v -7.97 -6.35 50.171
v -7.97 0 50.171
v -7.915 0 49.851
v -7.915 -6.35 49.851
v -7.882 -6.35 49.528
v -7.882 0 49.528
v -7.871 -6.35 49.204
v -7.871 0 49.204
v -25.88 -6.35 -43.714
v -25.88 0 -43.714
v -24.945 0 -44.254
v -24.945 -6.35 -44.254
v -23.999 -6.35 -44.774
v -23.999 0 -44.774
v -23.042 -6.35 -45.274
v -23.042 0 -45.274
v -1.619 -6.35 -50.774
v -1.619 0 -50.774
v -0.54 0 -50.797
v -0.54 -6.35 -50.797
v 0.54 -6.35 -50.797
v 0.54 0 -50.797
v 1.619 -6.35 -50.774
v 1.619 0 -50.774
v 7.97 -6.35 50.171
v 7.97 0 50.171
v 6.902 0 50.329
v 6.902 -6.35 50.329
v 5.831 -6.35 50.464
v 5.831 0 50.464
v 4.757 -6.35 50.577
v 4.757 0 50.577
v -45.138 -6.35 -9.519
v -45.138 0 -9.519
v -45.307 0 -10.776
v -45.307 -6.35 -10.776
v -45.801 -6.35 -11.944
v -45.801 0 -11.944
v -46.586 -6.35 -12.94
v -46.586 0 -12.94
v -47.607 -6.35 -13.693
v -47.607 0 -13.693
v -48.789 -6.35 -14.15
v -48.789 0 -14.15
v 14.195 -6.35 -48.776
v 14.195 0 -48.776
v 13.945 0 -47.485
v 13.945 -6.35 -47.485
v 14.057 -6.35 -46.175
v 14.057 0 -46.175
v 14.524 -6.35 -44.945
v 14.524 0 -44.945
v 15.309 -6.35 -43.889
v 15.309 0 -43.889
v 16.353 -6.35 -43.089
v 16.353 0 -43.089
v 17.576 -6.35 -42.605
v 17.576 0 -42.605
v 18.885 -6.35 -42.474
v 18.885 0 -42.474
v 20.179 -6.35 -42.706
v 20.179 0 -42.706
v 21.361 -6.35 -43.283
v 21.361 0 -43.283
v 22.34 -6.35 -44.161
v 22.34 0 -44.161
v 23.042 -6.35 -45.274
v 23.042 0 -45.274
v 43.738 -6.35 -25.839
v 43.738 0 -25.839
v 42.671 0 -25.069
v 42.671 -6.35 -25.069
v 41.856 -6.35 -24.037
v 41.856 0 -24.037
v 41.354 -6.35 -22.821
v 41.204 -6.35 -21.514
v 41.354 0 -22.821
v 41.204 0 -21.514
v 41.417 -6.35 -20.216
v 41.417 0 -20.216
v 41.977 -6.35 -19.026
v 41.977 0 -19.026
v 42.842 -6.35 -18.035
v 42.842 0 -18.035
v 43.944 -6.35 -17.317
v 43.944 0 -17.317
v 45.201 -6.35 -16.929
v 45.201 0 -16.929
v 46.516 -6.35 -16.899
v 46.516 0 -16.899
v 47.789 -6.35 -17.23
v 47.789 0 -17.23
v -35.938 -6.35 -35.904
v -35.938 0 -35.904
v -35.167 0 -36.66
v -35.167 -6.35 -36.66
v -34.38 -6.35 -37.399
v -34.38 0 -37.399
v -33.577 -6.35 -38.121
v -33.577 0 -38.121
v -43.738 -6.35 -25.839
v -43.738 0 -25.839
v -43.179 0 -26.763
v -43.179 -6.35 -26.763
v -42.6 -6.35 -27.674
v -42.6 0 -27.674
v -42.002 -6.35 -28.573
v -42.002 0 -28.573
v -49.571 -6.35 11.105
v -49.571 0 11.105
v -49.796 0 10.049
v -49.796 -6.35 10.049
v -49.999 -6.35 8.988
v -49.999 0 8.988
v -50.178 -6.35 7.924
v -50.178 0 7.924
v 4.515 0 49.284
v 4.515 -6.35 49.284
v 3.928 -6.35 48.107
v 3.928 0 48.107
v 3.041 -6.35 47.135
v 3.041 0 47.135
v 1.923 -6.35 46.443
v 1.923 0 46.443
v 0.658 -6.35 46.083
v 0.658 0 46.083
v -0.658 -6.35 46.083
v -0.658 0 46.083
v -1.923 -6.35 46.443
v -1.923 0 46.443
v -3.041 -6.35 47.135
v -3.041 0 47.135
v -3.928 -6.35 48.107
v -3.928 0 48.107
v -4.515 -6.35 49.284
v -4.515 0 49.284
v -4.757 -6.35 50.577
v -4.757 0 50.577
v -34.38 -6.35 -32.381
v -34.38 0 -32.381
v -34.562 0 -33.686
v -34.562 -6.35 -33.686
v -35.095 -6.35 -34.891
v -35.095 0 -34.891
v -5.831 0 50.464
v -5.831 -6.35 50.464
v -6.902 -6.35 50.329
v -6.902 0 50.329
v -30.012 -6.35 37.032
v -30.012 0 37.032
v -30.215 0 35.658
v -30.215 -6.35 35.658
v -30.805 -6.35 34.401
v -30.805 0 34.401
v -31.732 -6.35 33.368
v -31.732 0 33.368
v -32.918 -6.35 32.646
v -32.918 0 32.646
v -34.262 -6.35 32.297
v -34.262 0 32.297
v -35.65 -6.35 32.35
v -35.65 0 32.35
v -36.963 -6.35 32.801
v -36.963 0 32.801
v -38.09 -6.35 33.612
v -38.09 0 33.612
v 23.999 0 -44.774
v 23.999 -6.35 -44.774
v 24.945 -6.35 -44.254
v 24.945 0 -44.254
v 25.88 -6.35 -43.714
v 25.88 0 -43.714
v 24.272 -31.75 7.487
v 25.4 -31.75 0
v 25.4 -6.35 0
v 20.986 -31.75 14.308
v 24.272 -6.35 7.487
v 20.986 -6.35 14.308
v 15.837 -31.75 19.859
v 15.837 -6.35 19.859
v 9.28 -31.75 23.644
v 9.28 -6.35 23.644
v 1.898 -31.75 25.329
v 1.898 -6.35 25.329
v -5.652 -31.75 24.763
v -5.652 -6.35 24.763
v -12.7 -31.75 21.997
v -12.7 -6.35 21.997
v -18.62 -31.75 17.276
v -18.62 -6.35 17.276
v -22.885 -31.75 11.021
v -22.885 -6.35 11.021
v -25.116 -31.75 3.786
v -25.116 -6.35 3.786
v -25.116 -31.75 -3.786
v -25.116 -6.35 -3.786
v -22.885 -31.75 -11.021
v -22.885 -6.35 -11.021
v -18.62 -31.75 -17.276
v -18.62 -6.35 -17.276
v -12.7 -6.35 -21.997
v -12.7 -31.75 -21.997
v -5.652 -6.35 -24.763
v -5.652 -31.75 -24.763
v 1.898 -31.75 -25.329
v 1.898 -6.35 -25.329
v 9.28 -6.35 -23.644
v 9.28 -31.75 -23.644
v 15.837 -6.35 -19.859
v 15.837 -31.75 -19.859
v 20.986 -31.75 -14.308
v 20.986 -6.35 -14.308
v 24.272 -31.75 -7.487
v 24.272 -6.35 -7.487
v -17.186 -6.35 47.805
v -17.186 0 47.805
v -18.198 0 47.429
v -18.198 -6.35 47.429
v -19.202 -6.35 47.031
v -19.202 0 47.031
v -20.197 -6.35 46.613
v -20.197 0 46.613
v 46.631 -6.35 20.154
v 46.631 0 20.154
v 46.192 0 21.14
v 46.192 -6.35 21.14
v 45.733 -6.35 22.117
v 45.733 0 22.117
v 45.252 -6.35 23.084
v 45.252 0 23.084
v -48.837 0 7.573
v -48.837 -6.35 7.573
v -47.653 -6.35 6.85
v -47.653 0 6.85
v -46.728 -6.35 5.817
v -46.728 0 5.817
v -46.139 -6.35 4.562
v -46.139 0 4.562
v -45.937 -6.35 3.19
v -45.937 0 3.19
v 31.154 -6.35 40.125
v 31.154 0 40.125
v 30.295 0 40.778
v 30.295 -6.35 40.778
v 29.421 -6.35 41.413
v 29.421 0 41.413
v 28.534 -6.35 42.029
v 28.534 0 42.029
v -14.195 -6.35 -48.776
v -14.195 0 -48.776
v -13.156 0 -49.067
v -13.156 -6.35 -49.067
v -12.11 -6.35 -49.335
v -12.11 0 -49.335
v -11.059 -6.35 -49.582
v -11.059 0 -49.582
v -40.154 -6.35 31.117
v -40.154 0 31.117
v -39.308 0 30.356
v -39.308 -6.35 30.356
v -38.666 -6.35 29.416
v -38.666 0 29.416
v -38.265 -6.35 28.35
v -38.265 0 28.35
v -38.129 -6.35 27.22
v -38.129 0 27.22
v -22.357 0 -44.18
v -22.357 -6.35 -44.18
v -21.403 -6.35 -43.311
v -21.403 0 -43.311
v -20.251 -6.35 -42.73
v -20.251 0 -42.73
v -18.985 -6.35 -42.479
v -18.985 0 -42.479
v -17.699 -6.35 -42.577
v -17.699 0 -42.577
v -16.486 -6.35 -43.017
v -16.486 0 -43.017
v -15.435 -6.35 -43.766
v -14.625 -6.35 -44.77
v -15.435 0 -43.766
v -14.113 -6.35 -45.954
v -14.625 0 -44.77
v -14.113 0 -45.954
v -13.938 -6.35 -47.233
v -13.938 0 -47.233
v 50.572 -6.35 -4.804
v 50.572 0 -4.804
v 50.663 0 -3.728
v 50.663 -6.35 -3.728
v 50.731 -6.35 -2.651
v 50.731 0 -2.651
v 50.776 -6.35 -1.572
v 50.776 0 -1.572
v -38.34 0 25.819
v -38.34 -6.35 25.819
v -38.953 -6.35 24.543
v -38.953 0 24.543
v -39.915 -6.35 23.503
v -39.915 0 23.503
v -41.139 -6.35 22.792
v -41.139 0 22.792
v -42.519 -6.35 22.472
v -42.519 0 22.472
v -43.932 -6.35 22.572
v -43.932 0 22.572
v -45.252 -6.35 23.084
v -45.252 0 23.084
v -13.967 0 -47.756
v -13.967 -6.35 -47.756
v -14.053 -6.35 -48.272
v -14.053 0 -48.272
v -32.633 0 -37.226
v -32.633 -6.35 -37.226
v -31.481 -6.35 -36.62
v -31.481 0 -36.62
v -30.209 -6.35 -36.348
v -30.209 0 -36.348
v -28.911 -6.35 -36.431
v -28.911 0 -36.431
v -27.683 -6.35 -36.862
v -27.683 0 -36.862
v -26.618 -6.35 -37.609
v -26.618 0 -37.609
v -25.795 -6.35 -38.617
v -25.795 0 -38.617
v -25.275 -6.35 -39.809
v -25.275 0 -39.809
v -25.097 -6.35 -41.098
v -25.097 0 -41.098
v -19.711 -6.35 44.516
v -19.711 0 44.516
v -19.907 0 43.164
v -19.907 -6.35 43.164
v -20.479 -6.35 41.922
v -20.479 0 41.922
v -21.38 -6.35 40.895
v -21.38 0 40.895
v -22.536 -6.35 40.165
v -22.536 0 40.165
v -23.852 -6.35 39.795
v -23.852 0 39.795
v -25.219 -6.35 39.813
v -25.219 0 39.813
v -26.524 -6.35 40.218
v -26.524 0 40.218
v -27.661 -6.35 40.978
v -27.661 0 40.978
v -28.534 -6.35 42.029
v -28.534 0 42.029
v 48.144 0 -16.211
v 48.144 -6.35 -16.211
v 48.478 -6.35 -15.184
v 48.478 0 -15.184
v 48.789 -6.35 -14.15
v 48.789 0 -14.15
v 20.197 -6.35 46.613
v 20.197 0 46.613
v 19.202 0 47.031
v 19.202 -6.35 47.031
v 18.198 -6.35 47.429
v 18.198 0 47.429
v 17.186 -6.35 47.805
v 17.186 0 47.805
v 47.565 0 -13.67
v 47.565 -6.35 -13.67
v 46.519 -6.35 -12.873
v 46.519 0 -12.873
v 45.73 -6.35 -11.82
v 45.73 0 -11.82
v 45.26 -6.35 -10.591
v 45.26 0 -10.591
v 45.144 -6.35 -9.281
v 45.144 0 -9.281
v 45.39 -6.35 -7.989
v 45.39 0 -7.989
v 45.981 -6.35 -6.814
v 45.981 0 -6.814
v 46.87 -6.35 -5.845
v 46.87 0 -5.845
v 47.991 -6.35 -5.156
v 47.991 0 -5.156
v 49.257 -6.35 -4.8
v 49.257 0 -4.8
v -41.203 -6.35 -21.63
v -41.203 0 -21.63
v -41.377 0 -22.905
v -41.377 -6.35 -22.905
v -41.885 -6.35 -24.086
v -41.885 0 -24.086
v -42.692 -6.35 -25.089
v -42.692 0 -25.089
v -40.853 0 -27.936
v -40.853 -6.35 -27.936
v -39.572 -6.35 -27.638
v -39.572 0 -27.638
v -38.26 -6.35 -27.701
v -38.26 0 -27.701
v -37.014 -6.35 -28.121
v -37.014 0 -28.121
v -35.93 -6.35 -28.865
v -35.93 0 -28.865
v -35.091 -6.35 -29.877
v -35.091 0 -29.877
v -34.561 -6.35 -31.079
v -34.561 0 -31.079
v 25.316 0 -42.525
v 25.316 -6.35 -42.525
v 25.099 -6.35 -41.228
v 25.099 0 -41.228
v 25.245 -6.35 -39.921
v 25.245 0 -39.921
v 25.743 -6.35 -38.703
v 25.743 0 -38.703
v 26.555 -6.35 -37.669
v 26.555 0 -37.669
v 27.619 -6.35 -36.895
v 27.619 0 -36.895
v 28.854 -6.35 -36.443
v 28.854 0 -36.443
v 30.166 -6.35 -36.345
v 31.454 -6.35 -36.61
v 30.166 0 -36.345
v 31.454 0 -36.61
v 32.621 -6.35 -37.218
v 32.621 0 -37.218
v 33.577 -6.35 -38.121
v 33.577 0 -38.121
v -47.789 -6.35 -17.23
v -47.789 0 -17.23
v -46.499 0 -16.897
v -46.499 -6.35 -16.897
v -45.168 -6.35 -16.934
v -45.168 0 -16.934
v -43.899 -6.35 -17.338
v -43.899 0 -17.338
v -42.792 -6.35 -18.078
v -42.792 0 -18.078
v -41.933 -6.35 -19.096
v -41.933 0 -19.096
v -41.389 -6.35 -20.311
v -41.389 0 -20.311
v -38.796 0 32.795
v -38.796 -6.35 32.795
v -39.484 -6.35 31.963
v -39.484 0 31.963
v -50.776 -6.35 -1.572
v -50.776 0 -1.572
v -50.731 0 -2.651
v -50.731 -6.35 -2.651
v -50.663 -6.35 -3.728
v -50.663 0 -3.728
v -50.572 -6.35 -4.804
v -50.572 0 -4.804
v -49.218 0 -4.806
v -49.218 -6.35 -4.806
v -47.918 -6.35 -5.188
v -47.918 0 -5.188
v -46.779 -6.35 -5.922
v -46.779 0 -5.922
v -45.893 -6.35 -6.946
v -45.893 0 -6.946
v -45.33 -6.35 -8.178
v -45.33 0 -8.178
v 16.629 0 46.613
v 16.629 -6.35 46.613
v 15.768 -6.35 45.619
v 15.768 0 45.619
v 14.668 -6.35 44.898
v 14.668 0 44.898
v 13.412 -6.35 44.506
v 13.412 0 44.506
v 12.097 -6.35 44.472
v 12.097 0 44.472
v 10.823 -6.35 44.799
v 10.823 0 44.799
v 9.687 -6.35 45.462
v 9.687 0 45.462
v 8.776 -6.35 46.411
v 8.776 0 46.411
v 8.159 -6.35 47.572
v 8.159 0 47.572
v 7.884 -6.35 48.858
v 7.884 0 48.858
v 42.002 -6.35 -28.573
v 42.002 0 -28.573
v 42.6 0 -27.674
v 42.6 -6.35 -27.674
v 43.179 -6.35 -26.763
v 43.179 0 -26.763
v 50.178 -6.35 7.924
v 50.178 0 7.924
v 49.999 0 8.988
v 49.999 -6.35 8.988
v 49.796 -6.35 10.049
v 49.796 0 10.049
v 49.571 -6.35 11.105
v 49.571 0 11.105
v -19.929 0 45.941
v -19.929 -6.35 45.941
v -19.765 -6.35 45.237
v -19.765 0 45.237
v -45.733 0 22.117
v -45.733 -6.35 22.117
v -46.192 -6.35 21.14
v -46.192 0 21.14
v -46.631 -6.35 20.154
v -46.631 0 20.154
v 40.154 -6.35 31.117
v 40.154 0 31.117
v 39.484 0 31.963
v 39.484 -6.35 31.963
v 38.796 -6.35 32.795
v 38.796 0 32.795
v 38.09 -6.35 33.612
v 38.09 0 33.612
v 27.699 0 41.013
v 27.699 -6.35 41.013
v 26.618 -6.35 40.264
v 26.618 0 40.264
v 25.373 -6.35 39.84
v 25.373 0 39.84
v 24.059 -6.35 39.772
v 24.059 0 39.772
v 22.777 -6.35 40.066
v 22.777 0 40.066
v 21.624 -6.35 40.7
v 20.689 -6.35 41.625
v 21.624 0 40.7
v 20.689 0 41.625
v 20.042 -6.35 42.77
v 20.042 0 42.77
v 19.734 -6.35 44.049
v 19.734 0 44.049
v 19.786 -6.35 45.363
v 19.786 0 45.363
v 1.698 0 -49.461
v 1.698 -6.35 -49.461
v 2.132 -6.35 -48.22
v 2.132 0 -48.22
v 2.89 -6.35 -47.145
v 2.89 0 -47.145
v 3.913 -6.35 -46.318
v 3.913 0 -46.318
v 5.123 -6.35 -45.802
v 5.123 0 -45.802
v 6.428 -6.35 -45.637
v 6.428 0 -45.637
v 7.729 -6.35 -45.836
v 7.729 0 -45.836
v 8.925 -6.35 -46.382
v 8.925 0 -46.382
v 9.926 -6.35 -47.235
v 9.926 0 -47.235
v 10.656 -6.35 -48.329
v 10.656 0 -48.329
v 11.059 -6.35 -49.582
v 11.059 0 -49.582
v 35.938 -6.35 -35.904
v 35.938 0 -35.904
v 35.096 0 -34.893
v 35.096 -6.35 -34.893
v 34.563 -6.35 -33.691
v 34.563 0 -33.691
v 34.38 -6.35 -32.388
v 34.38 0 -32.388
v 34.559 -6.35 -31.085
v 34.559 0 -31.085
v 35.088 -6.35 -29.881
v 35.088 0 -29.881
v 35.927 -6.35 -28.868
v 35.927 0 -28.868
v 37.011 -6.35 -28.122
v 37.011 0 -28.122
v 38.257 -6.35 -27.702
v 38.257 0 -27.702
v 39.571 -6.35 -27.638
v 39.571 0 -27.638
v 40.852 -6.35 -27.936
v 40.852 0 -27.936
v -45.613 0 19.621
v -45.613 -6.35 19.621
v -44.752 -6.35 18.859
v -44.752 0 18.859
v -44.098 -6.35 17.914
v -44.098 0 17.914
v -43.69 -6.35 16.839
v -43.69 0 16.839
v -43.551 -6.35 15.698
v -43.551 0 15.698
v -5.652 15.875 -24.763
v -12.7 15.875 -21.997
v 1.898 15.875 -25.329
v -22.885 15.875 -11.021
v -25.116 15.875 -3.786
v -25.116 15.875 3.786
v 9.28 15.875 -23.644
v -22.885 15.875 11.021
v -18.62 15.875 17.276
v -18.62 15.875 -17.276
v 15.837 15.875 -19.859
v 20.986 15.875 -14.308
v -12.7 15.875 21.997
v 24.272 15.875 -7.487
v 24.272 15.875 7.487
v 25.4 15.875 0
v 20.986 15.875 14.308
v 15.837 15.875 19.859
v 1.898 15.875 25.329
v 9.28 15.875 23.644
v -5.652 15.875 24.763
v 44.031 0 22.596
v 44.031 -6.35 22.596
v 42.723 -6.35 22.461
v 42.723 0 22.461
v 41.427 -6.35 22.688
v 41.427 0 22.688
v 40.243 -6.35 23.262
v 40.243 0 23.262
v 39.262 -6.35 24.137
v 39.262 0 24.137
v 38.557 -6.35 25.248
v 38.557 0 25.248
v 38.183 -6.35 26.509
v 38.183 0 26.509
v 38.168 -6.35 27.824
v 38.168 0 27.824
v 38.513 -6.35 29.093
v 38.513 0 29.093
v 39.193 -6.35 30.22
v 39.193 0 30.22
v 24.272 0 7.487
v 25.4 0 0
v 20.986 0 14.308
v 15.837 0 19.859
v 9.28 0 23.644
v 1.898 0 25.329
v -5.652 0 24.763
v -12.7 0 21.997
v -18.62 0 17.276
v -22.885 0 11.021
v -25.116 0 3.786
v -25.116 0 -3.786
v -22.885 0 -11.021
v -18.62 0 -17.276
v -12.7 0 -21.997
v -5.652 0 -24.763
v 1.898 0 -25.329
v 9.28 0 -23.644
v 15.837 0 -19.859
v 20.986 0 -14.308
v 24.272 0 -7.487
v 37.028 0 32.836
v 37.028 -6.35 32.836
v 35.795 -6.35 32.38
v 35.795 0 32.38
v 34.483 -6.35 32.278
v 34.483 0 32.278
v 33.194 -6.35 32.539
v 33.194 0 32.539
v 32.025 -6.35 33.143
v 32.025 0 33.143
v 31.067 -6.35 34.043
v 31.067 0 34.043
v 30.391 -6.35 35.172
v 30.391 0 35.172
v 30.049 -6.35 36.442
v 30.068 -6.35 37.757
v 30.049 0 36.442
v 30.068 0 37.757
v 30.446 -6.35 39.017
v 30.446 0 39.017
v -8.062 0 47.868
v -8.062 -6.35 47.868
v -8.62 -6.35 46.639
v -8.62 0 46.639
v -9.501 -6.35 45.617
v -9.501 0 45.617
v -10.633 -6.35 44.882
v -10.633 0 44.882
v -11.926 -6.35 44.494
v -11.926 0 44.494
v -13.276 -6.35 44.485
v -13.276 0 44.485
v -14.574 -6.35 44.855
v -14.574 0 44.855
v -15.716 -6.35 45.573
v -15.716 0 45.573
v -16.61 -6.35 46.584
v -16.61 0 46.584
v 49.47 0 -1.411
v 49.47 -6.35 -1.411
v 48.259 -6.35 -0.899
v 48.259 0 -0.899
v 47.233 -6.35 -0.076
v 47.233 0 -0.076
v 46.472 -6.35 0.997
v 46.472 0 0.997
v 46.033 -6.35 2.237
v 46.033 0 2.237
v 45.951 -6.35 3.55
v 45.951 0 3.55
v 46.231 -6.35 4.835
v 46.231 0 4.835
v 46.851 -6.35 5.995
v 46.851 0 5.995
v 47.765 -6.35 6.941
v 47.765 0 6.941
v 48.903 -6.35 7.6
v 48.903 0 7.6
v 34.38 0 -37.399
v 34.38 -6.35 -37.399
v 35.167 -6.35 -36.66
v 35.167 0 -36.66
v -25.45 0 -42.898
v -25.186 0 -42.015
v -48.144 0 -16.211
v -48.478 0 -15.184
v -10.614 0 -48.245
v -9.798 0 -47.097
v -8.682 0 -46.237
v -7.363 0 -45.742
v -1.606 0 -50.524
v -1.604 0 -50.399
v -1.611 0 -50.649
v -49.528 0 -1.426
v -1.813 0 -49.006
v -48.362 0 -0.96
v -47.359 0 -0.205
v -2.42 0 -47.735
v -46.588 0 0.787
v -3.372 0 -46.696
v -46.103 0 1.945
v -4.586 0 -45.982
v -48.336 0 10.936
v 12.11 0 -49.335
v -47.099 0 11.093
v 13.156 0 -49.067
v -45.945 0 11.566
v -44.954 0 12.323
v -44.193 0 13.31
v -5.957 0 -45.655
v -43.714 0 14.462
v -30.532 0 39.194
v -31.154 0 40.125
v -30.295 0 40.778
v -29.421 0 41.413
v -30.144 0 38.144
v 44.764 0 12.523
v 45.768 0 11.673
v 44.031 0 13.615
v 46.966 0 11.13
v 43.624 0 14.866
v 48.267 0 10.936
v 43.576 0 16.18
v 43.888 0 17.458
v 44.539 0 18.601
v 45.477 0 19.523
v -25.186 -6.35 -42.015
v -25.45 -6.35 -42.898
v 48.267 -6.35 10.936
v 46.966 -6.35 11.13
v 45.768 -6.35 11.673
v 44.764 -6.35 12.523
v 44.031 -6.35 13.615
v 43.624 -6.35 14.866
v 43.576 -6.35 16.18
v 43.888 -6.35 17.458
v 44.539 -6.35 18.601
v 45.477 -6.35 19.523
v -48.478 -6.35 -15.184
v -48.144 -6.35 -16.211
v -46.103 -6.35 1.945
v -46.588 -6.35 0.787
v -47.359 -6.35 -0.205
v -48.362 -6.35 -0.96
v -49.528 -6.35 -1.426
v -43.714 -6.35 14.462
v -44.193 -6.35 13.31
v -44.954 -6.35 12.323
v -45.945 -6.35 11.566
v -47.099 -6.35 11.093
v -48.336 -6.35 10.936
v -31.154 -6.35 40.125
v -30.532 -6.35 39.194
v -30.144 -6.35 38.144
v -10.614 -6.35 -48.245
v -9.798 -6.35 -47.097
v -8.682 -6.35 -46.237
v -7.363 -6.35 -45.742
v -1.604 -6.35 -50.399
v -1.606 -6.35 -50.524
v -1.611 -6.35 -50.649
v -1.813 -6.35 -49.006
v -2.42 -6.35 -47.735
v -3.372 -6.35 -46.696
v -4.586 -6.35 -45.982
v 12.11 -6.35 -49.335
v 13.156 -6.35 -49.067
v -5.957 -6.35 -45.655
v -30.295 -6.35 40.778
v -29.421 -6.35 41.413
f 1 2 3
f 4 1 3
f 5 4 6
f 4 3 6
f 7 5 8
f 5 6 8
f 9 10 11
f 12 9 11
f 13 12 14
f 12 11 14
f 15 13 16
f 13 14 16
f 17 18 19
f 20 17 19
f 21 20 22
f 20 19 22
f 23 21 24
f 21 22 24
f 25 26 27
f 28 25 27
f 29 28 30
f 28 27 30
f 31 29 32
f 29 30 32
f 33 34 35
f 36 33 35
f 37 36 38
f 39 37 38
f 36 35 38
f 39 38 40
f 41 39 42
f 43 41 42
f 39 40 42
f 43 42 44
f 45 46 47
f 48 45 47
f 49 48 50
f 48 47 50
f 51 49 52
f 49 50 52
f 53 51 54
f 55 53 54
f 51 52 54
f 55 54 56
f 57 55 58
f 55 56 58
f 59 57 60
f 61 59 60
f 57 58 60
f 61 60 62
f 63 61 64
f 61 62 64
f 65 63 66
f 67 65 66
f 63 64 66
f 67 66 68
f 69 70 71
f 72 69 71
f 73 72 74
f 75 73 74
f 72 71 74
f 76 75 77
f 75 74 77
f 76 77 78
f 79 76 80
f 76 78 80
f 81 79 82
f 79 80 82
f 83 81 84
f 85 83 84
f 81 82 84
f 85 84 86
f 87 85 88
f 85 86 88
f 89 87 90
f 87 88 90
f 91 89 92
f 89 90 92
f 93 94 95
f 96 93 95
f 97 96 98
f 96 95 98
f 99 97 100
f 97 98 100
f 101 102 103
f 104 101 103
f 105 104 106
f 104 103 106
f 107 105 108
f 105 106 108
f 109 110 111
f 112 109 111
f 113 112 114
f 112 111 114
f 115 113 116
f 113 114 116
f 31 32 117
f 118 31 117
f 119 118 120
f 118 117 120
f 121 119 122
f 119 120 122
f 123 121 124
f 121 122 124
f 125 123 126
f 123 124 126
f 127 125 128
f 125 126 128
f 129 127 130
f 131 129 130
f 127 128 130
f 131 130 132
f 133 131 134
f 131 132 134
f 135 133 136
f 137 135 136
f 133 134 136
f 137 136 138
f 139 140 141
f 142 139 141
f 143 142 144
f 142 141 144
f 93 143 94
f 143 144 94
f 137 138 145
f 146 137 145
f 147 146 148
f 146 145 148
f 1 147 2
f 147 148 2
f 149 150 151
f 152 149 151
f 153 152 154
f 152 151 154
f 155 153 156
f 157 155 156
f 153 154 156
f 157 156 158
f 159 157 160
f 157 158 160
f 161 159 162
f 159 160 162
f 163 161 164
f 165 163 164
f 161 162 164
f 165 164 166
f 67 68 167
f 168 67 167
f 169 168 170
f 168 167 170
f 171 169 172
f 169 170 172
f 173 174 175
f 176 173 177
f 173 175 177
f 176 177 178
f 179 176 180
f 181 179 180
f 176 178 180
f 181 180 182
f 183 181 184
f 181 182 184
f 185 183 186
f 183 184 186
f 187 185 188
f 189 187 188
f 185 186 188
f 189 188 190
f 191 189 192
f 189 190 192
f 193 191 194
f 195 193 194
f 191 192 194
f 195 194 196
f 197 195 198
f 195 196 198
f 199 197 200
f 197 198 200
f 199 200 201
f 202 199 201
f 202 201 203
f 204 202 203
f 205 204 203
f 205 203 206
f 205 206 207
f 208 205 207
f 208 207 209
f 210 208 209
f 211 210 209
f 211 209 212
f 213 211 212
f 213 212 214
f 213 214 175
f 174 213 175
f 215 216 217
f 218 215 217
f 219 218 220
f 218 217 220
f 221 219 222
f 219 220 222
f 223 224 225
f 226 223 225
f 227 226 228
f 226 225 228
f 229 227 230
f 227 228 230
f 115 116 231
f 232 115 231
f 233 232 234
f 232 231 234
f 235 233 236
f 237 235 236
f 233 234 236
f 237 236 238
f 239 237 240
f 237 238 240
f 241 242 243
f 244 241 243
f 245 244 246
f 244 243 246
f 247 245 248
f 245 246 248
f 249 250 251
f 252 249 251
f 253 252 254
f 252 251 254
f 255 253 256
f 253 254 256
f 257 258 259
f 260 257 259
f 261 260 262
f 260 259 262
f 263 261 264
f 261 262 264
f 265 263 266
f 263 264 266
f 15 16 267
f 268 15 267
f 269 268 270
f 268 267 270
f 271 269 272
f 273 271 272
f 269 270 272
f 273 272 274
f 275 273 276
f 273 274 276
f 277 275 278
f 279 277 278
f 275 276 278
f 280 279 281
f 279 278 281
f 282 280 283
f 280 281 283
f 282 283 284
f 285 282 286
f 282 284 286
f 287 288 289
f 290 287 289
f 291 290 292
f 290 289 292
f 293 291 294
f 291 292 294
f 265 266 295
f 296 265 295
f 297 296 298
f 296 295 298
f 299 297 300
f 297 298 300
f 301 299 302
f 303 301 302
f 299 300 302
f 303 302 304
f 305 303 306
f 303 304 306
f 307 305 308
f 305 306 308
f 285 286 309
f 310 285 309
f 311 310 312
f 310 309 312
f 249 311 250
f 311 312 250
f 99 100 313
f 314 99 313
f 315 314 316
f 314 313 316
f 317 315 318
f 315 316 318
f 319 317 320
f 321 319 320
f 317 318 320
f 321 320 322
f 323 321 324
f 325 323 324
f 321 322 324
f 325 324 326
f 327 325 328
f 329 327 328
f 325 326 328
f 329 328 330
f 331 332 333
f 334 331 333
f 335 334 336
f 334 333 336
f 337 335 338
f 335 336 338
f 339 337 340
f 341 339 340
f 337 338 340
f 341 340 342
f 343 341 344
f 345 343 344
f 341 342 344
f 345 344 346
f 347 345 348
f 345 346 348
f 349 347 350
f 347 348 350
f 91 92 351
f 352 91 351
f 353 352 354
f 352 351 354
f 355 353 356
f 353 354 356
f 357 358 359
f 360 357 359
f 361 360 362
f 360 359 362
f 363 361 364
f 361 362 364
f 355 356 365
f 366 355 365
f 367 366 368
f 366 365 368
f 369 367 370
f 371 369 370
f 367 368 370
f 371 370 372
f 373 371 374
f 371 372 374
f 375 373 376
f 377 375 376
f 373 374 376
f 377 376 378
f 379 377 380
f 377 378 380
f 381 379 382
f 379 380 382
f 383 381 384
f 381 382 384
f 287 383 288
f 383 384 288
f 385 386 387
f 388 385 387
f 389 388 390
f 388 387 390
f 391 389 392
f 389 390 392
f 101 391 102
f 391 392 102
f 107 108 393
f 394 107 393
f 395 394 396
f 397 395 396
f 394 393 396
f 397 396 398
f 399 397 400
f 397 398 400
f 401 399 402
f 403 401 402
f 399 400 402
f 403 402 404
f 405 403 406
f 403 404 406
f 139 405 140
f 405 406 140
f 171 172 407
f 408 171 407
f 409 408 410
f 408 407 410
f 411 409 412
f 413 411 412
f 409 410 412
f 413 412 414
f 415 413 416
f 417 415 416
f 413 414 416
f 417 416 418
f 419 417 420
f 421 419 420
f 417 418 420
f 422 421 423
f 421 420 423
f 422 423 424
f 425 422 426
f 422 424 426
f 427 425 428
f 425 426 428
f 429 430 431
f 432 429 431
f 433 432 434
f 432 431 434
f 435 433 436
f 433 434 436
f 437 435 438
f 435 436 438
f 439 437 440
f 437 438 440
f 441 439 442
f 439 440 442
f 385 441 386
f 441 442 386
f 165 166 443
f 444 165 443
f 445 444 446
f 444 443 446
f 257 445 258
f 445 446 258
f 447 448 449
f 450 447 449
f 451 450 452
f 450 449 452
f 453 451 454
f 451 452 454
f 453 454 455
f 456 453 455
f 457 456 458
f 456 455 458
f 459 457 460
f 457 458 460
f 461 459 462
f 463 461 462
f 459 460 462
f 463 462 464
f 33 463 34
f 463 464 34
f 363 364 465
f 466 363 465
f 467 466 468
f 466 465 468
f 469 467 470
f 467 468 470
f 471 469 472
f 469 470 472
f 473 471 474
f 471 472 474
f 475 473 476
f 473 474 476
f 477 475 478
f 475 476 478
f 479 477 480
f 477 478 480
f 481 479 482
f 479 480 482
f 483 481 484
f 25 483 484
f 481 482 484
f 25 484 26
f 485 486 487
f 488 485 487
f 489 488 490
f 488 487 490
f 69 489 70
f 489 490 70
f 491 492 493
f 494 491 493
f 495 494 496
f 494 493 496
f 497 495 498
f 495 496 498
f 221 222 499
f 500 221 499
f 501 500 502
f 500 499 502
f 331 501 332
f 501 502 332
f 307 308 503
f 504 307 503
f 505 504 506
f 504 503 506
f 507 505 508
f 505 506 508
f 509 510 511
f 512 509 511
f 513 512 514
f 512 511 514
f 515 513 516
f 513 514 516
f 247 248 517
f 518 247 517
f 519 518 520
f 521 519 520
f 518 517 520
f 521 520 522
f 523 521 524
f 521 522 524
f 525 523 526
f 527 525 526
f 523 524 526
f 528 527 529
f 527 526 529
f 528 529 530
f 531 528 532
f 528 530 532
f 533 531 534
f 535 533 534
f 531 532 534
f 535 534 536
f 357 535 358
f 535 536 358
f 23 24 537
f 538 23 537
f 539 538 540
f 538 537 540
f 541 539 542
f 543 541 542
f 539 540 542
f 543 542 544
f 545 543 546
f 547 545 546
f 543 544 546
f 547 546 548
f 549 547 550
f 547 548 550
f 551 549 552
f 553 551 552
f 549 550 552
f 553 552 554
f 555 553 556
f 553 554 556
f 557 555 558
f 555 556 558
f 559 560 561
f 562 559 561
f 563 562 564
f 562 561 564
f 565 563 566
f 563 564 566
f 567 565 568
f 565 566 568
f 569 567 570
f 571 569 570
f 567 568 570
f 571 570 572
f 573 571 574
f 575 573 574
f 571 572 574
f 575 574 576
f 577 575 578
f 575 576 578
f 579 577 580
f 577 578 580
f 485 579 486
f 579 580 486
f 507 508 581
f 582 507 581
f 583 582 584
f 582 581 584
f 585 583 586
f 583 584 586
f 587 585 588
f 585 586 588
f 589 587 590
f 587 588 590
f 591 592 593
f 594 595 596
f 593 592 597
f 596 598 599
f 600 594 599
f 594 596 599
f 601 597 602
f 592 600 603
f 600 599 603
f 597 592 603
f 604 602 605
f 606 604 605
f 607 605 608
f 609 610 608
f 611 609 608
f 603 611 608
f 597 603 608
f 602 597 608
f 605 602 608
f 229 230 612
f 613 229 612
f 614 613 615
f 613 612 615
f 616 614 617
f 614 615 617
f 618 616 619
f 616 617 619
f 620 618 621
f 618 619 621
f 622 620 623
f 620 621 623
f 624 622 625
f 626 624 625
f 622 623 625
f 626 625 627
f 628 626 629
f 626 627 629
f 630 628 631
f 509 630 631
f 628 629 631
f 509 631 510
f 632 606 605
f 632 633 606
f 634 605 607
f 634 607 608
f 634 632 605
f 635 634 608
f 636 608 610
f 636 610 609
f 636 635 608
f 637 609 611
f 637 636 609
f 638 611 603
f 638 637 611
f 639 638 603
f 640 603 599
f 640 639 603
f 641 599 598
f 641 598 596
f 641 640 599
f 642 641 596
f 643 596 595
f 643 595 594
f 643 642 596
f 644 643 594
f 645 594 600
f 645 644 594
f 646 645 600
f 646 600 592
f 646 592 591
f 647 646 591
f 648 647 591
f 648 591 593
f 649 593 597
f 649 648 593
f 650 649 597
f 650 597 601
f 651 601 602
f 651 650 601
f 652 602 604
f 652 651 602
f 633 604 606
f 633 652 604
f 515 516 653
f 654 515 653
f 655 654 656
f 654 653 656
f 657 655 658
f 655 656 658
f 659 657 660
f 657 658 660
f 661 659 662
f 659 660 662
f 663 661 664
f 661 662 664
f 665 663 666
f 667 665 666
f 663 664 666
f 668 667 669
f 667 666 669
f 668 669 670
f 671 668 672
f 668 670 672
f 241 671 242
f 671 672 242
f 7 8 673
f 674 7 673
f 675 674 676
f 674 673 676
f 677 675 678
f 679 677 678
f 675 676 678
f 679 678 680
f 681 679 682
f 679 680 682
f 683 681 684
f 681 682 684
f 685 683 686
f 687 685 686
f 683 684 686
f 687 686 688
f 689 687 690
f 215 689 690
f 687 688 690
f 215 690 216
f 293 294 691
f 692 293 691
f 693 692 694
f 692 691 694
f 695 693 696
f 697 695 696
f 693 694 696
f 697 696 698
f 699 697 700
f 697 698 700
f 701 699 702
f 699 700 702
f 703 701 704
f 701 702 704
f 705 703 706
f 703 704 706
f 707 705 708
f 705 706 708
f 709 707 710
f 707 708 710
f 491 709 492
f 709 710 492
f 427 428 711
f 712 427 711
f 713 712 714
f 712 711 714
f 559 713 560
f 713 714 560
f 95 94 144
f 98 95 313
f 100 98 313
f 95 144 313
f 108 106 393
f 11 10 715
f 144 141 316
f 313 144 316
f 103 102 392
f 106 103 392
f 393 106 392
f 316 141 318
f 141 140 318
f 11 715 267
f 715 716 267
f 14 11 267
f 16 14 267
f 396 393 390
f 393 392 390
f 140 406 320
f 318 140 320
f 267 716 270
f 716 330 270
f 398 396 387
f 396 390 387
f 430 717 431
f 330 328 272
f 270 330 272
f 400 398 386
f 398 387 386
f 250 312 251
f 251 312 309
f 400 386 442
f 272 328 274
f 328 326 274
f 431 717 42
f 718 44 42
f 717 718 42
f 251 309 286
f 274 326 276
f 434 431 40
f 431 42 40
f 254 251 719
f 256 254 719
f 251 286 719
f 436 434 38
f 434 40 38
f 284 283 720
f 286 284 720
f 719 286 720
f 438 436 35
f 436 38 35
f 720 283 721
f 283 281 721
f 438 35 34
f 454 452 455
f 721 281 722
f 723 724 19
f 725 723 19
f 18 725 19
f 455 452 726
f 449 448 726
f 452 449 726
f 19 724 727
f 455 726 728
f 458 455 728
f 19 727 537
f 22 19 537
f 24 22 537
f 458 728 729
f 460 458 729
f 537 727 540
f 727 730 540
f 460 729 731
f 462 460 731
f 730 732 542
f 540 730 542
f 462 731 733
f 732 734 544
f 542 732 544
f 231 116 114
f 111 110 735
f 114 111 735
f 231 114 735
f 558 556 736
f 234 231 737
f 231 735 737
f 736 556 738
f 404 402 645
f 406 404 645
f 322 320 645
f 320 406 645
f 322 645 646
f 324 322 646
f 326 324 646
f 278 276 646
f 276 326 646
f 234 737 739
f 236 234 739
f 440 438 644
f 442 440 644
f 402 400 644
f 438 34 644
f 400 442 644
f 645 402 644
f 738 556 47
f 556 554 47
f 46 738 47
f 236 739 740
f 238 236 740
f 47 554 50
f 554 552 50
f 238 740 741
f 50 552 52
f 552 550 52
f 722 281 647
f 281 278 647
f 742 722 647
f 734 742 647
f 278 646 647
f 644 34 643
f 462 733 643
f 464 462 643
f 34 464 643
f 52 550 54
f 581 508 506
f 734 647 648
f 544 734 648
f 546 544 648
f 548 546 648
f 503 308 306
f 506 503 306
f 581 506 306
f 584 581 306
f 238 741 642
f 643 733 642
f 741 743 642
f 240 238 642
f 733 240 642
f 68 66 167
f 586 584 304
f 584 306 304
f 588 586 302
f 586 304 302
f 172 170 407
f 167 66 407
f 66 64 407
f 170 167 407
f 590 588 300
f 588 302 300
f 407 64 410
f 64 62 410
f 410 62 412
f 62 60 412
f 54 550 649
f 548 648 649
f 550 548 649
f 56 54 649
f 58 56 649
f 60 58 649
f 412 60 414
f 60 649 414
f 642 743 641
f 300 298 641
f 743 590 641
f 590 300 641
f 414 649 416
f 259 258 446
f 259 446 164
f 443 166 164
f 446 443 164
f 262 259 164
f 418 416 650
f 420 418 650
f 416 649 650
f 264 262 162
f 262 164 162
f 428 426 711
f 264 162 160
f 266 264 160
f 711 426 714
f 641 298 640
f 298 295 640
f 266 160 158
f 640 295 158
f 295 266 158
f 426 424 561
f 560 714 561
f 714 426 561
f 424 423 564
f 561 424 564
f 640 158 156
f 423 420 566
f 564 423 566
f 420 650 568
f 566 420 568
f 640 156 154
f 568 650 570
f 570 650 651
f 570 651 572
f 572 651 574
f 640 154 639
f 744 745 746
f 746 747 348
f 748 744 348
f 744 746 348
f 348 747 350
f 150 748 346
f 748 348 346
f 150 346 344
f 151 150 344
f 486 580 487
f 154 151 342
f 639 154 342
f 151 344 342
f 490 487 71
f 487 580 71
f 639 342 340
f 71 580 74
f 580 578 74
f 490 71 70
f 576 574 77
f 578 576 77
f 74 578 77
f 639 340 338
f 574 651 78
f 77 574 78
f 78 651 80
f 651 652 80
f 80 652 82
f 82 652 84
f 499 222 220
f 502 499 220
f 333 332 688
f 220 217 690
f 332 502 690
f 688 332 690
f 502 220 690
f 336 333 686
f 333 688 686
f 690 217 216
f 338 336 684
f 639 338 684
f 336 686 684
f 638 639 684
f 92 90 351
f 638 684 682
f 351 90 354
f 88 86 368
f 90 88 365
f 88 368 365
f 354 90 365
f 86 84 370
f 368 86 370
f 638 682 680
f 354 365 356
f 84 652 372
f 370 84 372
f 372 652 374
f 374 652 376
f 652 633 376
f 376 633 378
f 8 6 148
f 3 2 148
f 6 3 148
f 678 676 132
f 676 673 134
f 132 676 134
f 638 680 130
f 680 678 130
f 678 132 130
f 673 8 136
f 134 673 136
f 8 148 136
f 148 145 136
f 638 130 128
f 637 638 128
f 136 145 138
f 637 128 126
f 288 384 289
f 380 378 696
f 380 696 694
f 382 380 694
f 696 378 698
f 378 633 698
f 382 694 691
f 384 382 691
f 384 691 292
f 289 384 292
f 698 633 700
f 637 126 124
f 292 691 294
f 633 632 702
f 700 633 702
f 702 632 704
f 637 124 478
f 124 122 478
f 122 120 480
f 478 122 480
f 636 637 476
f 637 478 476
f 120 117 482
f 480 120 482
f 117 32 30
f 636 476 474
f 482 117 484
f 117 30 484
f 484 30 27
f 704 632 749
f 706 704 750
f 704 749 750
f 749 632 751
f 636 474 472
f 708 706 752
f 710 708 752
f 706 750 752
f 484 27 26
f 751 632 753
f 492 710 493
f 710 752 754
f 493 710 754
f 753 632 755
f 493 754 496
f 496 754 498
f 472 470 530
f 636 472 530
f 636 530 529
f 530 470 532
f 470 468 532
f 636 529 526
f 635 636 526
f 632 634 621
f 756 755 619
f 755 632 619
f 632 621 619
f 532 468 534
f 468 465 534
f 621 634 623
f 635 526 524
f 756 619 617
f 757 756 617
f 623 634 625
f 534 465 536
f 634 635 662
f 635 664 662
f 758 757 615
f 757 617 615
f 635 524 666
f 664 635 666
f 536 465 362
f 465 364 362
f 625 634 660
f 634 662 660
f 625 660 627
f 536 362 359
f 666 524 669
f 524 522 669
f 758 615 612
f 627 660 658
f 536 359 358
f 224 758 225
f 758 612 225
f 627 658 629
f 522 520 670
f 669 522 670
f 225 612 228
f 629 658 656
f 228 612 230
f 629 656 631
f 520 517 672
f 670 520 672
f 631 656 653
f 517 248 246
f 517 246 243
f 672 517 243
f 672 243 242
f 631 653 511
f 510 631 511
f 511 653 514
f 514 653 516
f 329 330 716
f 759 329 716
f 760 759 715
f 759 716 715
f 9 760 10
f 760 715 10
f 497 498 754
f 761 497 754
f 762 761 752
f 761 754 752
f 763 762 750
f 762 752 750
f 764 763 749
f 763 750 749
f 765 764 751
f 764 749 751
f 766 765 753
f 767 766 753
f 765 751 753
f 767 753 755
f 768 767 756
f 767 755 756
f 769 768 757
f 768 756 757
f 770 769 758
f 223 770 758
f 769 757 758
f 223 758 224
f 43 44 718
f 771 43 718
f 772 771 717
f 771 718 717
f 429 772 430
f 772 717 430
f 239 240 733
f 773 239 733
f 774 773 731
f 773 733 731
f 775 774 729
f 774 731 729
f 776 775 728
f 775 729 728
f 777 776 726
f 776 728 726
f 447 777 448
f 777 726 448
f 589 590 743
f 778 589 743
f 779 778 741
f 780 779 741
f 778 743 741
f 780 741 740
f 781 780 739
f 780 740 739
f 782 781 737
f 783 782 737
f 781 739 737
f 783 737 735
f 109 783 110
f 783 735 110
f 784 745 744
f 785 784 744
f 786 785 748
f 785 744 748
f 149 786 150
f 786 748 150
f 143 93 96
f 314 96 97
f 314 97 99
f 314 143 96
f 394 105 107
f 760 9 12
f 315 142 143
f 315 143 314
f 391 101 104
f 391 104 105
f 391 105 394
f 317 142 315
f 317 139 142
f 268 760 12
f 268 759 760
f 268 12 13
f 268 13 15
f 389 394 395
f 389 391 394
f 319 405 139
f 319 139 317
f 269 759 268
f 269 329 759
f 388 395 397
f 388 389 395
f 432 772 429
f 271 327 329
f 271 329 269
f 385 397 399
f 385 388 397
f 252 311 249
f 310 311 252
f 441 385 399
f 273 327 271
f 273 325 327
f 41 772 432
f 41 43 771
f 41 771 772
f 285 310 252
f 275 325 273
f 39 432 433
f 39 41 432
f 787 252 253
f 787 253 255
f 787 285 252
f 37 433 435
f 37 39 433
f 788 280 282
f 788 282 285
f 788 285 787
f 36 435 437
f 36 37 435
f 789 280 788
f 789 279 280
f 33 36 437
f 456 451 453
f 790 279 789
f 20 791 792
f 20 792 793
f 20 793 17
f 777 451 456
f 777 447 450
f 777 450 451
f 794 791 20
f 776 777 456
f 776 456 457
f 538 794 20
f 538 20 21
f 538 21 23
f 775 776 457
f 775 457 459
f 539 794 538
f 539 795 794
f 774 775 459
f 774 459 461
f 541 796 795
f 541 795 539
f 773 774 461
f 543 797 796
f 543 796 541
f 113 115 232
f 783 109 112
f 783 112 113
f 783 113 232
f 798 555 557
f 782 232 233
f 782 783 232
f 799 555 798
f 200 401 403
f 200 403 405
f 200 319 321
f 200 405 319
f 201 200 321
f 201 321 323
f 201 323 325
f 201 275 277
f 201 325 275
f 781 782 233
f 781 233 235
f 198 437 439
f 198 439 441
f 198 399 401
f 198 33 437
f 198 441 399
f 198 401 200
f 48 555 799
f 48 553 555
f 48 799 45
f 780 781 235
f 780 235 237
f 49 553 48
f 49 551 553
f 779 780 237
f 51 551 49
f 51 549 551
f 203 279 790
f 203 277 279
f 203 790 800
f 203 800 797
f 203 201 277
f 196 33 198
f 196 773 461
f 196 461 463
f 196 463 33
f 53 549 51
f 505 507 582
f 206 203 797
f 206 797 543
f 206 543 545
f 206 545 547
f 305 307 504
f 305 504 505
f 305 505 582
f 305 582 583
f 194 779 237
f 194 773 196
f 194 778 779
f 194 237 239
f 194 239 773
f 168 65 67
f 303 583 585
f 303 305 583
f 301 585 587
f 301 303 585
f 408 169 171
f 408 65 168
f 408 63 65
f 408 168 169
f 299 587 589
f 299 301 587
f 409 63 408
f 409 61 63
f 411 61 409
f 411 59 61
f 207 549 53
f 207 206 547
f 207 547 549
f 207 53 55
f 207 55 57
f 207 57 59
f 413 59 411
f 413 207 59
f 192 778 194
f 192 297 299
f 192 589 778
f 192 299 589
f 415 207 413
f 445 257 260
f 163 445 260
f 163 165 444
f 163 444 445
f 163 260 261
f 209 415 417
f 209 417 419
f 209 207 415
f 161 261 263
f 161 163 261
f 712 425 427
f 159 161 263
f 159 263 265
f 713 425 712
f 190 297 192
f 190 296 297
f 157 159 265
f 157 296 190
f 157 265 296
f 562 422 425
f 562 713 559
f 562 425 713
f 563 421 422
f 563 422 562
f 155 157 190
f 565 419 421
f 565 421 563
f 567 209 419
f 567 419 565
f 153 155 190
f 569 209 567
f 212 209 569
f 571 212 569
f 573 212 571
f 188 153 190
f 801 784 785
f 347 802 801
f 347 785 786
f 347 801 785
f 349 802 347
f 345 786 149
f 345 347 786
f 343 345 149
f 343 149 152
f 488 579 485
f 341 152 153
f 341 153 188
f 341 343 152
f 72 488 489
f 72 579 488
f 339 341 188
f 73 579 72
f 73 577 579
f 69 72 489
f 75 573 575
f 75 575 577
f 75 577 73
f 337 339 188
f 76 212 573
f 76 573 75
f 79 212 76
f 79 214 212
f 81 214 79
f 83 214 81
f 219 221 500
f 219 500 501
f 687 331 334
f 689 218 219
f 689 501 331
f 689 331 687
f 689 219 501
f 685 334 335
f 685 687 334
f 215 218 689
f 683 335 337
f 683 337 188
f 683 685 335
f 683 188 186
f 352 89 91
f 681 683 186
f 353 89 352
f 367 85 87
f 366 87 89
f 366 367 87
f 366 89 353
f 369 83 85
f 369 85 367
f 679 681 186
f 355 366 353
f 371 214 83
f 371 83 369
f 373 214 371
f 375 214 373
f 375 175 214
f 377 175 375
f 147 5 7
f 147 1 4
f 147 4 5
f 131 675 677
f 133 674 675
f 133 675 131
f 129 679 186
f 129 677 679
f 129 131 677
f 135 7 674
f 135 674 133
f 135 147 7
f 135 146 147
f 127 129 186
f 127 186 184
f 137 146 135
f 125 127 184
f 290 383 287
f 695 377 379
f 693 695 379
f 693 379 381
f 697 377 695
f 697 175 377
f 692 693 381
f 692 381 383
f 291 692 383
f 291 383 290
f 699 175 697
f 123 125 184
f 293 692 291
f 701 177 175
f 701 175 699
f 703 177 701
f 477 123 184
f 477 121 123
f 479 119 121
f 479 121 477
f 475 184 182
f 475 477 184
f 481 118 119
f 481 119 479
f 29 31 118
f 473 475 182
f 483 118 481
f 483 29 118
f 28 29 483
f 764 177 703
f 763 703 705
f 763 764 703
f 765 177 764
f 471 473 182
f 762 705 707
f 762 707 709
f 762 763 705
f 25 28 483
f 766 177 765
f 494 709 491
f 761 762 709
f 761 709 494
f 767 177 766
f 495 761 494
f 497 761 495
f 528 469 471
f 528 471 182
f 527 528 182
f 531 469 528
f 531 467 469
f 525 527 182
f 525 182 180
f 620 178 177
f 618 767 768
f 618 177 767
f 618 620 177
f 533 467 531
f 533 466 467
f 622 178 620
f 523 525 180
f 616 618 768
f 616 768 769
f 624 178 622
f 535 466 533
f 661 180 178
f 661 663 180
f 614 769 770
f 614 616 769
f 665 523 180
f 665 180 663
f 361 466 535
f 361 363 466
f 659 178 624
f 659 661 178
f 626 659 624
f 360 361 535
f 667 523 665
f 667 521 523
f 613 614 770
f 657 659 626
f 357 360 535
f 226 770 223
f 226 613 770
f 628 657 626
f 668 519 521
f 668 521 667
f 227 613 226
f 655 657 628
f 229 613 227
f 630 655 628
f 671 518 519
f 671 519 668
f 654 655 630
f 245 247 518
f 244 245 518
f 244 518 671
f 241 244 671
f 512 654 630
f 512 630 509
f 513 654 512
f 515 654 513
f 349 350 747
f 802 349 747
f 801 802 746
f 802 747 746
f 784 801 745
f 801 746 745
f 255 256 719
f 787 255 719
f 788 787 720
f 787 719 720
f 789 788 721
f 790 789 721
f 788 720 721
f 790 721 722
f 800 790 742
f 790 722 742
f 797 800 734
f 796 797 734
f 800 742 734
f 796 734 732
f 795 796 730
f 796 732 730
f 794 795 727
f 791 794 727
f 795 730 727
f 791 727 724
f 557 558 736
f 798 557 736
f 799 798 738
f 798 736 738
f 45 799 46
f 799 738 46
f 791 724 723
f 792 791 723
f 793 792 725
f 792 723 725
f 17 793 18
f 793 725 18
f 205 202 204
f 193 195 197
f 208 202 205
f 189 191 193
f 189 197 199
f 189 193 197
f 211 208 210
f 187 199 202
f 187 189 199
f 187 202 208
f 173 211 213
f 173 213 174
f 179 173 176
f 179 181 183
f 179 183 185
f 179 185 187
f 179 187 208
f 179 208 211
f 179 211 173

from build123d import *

# Parameters (mm, degrees)
F0_R          = 25.4
F1_DEPTH      = 6.35
F2_DEPTH      = 31.75
F2_DEPTH_BACK = 3.175
F3_DEPTH      = 12.7


with BuildPart() as f1:
    # F0 (on Front) → F1 (new body)
    with BuildSketch(Plane.XZ):
        with BuildLine():
            ThreePointArc((50.7756672677, -1.5721366092), (45.94665551, 2.8907185428), (50.1782450005, 7.9236184075))
            ThreePointArc((50.1782450005, 7.9236184075), (49.900192337, 9.518970781), (49.5714307865, 11.1046499169))
            ThreePointArc((49.5714307865, 11.1046499169), (43.7842643689, 14.2263698785), (46.6312793948, 20.153505452))
            ThreePointArc((46.6312793948, 20.153505452), (45.9652142653, 21.6295880115), (45.2524389981, 23.0836904486))
            ThreePointArc((45.2524389981, 23.0836904486), (38.8707468703, 24.6681260738), (40.1542990068, 31.1170736296))
            ThreePointArc((40.1542990068, 31.1170736296), (39.142072733, 32.3811386792), (38.0900700405, 33.6122978136))
            ThreePointArc((38.0900700405, 33.6122978136), (31.5148373892, 33.5598931849), (31.1542763351, 40.1254416304))
            ThreePointArc((31.1542763351, 40.1254416304), (29.8594908165, 41.0980633142), (28.5343618968, 42.0289208896))
            ThreePointArc((28.5343618968, 42.0289208896), (22.1787347715, 40.3429687825), (20.1967159038, 46.6125805626))
            ThreePointArc((20.1967159038, 46.6125805626), (18.7007272764, 47.2326454831), (17.1857348531, 47.8047122945))
            ThreePointArc((17.1857348531, 47.8047122945), (11.4490606804, 44.5911472805), (7.970121534, 50.1708796289))
            ThreePointArc((7.970121534, 50.1708796289), (6.3669282651, 50.3994268268), (4.7572648839, 50.5767578125))
            ThreePointArc((4.7572648839, 50.5767578125), (0, 46.0375), (-4.7572648839, 50.5767578125))
            ThreePointArc((-4.7572648839, 50.5767578125), (-6.3669282651, 50.3994268268), (-7.970121534, 50.1708796289))
            ThreePointArc((-7.970121534, 50.1708796289), (-7.8958049616, 49.6899886809), (-7.870946268, 49.2040245853))
            ThreePointArc((-7.870946268, 49.2040245853), (-11.9259394259, 44.4943706364), (-17.1857348531, 47.8047122945))
            ThreePointArc((-17.1857348531, 47.8047122945), (-18.7007272764, 47.2326454831), (-20.1967159038, 46.6125805626))
            ThreePointArc((-20.1967159038, 46.6125805626), (-19.8337105062, 45.5922953741), (-19.7105866444, 44.5163793462))
            ThreePointArc((-19.7105866444, 44.5163793462), (-23.1808825467, 39.9325365457), (-28.5343618968, 42.0289208896))
            ThreePointArc((-28.5343618968, 42.0289208896), (-29.8594908165, 41.0980633142), (-31.1542763351, 40.1254416304))
            ThreePointArc((-31.1542763351, 40.1254416304), (-30.3070477444, 38.6805063948), (-30.0124929812, 37.031606273))
            ThreePointArc((-30.0124929812, 37.031606273), (-32.9184704584, 32.6458645601), (-38.0900700405, 33.6122978136))
            ThreePointArc((-38.0900700405, 33.6122978136), (-39.142072733, 32.3811386792), (-40.1542990068, 31.1170736296))
            ThreePointArc((-40.1542990068, 31.1170736296), (-38.6658064456, 29.4158812606), (-38.1293586155, 27.2200011849))
            ThreePointArc((-38.1293586155, 27.2200011849), (-40.5002961369, 23.1015263263), (-45.2524389981, 23.0836904486))
            ThreePointArc((-45.2524389981, 23.0836904486), (-45.9652142653, 21.6295880115), (-46.6312793948, 20.153505452))
            ThreePointArc((-46.6312793948, 20.153505452), (-44.3961592919, 18.4062930033), (-43.5511710278, 15.6980633142))
            ThreePointArc((-43.5511710278, 15.6980633142), (-45.4247849623, 11.9118061187), (-49.5714307865, 11.1046499169))
            ThreePointArc((-49.5714307865, 11.1046499169), (-49.900192337, 9.518970781), (-50.1782450005, 7.9236184075))
            ThreePointArc((-50.1782450005, 7.9236184075), (-47.1525680025, 6.3676272946), (-45.9372578042, 3.1897583921))
            ThreePointArc((-45.9372578042, 3.1897583921), (-47.3591076107, -0.2045696025), (-50.7756672677, -1.5721366092))
            ThreePointArc((-50.7756672677, -1.5721366092), (-50.6997578042, -3.1897583921), (-50.5723269302, -4.8041387226))
            ThreePointArc((-50.5723269302, -4.8041387226), (-46.7792657719, -5.9215795561), (-45.137692337, -9.518970781))
            ThreePointArc((-45.137692337, -9.518970781), (-46.1604620648, -12.4678389946), (-48.7894818346, -14.1501400102))
            ThreePointArc((-48.7894818346, -14.1501400102), (-48.3136710278, -15.6980633142), (-47.7887635668, -17.2300341484))
            ThreePointArc((-47.7887635668, -17.2300341484), (-43.3197698129, -17.6694074728), (-41.2027142653, -21.6295880115))
            ThreePointArc((-41.2027142653, -21.6295880115), (-41.8853816947, -24.0864910308), (-43.7376738227, -25.8390380738))
            ThreePointArc((-43.7376738227, -25.8390380738), (-42.8918586155, -27.2200011849), (-42.0024564338, -28.5733031609))
            ThreePointArc((-42.0024564338, -28.5733031609), (-37.0138306327, -28.1206232395), (-34.379572733, -32.3811386792))
            ThreePointArc((-34.379572733, -32.3811386792), (-34.7864792609, -34.3073296759), (-35.9376669086, -35.9043743458))
            ThreePointArc((-35.9376669086, -35.9043743458), (-34.7749929812, -37.031606273), (-33.5769804888, -38.1212064507))
            ThreePointArc((-33.5769804888, -38.1212064507), (-28.2820147175, -36.604403847), (-25.0969908165, -41.0980633142))
            ThreePointArc((-25.0969908165, -41.0980633142), (-25.2968267537, -42.4631651056), (-25.8795642131, -43.7137067307))
            ThreePointArc((-25.8795642131, -43.7137067307), (-24.4730866444, -44.5163793462), (-23.0417393722, -45.2738141391))
            ThreePointArc((-23.0417393722, -45.2738141391), (-17.6988949192, -42.5767096827), (-13.9382272764, -47.2326454831))
            ThreePointArc((-13.9382272764, -47.2326454831), (-14.0029485609, -48.0151295985), (-14.1953533198, -48.7763461539))
            ThreePointArc((-14.1953533198, -48.7763461539), (-12.633446268, -49.2040245853), (-11.0587010292, -49.5817015798))
            ThreePointArc((-11.0587010292, -49.5817015798), (-5.9565391444, -45.6546415819), (-1.6044282651, -50.3994268268))
            ThreePointArc((-1.6044282651, -50.3994268268), (-1.6081216736, -50.5869530242), (-1.6191961705, -50.7741883614))
            ThreePointArc((-1.6191961705, -50.7741883614), (0, -50.8), (1.6191961705, -50.7741883614))
            ThreePointArc((1.6191961705, -50.7741883614), (5.7700287402, -45.6744805618), (11.0587010292, -49.5817015798))
            ThreePointArc((11.0587010292, -49.5817015798), (12.633446268, -49.2040245853), (14.1953533198, -48.7763461539))
            ThreePointArc((14.1953533198, -48.7763461539), (16.9475340942, -42.8045849691), (23.0417393722, -45.2738141391))
            ThreePointArc((23.0417393722, -45.2738141391), (24.4730866444, -44.5163793462), (25.8795642131, -43.7137067307))
            ThreePointArc((25.8795642131, -43.7137067307), (27.0601635524, -37.2451198785), (33.5769804888, -38.1212064507))
            ThreePointArc((33.5769804888, -38.1212064507), (34.7749929812, -37.031606273), (35.9376669086, -35.9043743458))
            ThreePointArc((35.9376669086, -35.9043743458), (35.4725034143, -29.3454069281), (42.0024564338, -28.5733031609))
            ThreePointArc((42.0024564338, -28.5733031609), (42.8918586155, -27.2200011849), (43.7376738227, -25.8390380738))
            ThreePointArc((43.7376738227, -25.8390380738), (41.6559754279, -19.6018141354), (47.7887635668, -17.2300341484))
            ThreePointArc((47.7887635668, -17.2300341484), (48.3136710278, -15.6980633142), (48.7894818346, -14.1501400102))
            ThreePointArc((48.7894818346, -14.1501400102), (45.2220493054, -8.6265672702), (50.5723269302, -4.8041387226))
            ThreePointArc((50.5723269302, -4.8041387226), (50.6997578042, -3.1897583921), (50.7756672677, -1.5721366092))
        make_face()
        Circle(F0_R, mode=Mode.SUBTRACT)
    extrude(amount=F1_DEPTH)

    # F0 (on Front) → F2 (join, two sides)
    with BuildSketch(Plane.XZ) as f2_sk:
        Circle(F0_R)
    extrude(amount=F2_DEPTH)
    extrude(f2_sk.sketch, amount=-F2_DEPTH_BACK)

    # F3 (add): a face of the model
    f3_faces = [f1.faces().sort_by_distance(p)[0] for p in [
        (0, 3.175, 0),
    ]]
    extrude(f3_faces, amount=F3_DEPTH)


solid = f1.part
